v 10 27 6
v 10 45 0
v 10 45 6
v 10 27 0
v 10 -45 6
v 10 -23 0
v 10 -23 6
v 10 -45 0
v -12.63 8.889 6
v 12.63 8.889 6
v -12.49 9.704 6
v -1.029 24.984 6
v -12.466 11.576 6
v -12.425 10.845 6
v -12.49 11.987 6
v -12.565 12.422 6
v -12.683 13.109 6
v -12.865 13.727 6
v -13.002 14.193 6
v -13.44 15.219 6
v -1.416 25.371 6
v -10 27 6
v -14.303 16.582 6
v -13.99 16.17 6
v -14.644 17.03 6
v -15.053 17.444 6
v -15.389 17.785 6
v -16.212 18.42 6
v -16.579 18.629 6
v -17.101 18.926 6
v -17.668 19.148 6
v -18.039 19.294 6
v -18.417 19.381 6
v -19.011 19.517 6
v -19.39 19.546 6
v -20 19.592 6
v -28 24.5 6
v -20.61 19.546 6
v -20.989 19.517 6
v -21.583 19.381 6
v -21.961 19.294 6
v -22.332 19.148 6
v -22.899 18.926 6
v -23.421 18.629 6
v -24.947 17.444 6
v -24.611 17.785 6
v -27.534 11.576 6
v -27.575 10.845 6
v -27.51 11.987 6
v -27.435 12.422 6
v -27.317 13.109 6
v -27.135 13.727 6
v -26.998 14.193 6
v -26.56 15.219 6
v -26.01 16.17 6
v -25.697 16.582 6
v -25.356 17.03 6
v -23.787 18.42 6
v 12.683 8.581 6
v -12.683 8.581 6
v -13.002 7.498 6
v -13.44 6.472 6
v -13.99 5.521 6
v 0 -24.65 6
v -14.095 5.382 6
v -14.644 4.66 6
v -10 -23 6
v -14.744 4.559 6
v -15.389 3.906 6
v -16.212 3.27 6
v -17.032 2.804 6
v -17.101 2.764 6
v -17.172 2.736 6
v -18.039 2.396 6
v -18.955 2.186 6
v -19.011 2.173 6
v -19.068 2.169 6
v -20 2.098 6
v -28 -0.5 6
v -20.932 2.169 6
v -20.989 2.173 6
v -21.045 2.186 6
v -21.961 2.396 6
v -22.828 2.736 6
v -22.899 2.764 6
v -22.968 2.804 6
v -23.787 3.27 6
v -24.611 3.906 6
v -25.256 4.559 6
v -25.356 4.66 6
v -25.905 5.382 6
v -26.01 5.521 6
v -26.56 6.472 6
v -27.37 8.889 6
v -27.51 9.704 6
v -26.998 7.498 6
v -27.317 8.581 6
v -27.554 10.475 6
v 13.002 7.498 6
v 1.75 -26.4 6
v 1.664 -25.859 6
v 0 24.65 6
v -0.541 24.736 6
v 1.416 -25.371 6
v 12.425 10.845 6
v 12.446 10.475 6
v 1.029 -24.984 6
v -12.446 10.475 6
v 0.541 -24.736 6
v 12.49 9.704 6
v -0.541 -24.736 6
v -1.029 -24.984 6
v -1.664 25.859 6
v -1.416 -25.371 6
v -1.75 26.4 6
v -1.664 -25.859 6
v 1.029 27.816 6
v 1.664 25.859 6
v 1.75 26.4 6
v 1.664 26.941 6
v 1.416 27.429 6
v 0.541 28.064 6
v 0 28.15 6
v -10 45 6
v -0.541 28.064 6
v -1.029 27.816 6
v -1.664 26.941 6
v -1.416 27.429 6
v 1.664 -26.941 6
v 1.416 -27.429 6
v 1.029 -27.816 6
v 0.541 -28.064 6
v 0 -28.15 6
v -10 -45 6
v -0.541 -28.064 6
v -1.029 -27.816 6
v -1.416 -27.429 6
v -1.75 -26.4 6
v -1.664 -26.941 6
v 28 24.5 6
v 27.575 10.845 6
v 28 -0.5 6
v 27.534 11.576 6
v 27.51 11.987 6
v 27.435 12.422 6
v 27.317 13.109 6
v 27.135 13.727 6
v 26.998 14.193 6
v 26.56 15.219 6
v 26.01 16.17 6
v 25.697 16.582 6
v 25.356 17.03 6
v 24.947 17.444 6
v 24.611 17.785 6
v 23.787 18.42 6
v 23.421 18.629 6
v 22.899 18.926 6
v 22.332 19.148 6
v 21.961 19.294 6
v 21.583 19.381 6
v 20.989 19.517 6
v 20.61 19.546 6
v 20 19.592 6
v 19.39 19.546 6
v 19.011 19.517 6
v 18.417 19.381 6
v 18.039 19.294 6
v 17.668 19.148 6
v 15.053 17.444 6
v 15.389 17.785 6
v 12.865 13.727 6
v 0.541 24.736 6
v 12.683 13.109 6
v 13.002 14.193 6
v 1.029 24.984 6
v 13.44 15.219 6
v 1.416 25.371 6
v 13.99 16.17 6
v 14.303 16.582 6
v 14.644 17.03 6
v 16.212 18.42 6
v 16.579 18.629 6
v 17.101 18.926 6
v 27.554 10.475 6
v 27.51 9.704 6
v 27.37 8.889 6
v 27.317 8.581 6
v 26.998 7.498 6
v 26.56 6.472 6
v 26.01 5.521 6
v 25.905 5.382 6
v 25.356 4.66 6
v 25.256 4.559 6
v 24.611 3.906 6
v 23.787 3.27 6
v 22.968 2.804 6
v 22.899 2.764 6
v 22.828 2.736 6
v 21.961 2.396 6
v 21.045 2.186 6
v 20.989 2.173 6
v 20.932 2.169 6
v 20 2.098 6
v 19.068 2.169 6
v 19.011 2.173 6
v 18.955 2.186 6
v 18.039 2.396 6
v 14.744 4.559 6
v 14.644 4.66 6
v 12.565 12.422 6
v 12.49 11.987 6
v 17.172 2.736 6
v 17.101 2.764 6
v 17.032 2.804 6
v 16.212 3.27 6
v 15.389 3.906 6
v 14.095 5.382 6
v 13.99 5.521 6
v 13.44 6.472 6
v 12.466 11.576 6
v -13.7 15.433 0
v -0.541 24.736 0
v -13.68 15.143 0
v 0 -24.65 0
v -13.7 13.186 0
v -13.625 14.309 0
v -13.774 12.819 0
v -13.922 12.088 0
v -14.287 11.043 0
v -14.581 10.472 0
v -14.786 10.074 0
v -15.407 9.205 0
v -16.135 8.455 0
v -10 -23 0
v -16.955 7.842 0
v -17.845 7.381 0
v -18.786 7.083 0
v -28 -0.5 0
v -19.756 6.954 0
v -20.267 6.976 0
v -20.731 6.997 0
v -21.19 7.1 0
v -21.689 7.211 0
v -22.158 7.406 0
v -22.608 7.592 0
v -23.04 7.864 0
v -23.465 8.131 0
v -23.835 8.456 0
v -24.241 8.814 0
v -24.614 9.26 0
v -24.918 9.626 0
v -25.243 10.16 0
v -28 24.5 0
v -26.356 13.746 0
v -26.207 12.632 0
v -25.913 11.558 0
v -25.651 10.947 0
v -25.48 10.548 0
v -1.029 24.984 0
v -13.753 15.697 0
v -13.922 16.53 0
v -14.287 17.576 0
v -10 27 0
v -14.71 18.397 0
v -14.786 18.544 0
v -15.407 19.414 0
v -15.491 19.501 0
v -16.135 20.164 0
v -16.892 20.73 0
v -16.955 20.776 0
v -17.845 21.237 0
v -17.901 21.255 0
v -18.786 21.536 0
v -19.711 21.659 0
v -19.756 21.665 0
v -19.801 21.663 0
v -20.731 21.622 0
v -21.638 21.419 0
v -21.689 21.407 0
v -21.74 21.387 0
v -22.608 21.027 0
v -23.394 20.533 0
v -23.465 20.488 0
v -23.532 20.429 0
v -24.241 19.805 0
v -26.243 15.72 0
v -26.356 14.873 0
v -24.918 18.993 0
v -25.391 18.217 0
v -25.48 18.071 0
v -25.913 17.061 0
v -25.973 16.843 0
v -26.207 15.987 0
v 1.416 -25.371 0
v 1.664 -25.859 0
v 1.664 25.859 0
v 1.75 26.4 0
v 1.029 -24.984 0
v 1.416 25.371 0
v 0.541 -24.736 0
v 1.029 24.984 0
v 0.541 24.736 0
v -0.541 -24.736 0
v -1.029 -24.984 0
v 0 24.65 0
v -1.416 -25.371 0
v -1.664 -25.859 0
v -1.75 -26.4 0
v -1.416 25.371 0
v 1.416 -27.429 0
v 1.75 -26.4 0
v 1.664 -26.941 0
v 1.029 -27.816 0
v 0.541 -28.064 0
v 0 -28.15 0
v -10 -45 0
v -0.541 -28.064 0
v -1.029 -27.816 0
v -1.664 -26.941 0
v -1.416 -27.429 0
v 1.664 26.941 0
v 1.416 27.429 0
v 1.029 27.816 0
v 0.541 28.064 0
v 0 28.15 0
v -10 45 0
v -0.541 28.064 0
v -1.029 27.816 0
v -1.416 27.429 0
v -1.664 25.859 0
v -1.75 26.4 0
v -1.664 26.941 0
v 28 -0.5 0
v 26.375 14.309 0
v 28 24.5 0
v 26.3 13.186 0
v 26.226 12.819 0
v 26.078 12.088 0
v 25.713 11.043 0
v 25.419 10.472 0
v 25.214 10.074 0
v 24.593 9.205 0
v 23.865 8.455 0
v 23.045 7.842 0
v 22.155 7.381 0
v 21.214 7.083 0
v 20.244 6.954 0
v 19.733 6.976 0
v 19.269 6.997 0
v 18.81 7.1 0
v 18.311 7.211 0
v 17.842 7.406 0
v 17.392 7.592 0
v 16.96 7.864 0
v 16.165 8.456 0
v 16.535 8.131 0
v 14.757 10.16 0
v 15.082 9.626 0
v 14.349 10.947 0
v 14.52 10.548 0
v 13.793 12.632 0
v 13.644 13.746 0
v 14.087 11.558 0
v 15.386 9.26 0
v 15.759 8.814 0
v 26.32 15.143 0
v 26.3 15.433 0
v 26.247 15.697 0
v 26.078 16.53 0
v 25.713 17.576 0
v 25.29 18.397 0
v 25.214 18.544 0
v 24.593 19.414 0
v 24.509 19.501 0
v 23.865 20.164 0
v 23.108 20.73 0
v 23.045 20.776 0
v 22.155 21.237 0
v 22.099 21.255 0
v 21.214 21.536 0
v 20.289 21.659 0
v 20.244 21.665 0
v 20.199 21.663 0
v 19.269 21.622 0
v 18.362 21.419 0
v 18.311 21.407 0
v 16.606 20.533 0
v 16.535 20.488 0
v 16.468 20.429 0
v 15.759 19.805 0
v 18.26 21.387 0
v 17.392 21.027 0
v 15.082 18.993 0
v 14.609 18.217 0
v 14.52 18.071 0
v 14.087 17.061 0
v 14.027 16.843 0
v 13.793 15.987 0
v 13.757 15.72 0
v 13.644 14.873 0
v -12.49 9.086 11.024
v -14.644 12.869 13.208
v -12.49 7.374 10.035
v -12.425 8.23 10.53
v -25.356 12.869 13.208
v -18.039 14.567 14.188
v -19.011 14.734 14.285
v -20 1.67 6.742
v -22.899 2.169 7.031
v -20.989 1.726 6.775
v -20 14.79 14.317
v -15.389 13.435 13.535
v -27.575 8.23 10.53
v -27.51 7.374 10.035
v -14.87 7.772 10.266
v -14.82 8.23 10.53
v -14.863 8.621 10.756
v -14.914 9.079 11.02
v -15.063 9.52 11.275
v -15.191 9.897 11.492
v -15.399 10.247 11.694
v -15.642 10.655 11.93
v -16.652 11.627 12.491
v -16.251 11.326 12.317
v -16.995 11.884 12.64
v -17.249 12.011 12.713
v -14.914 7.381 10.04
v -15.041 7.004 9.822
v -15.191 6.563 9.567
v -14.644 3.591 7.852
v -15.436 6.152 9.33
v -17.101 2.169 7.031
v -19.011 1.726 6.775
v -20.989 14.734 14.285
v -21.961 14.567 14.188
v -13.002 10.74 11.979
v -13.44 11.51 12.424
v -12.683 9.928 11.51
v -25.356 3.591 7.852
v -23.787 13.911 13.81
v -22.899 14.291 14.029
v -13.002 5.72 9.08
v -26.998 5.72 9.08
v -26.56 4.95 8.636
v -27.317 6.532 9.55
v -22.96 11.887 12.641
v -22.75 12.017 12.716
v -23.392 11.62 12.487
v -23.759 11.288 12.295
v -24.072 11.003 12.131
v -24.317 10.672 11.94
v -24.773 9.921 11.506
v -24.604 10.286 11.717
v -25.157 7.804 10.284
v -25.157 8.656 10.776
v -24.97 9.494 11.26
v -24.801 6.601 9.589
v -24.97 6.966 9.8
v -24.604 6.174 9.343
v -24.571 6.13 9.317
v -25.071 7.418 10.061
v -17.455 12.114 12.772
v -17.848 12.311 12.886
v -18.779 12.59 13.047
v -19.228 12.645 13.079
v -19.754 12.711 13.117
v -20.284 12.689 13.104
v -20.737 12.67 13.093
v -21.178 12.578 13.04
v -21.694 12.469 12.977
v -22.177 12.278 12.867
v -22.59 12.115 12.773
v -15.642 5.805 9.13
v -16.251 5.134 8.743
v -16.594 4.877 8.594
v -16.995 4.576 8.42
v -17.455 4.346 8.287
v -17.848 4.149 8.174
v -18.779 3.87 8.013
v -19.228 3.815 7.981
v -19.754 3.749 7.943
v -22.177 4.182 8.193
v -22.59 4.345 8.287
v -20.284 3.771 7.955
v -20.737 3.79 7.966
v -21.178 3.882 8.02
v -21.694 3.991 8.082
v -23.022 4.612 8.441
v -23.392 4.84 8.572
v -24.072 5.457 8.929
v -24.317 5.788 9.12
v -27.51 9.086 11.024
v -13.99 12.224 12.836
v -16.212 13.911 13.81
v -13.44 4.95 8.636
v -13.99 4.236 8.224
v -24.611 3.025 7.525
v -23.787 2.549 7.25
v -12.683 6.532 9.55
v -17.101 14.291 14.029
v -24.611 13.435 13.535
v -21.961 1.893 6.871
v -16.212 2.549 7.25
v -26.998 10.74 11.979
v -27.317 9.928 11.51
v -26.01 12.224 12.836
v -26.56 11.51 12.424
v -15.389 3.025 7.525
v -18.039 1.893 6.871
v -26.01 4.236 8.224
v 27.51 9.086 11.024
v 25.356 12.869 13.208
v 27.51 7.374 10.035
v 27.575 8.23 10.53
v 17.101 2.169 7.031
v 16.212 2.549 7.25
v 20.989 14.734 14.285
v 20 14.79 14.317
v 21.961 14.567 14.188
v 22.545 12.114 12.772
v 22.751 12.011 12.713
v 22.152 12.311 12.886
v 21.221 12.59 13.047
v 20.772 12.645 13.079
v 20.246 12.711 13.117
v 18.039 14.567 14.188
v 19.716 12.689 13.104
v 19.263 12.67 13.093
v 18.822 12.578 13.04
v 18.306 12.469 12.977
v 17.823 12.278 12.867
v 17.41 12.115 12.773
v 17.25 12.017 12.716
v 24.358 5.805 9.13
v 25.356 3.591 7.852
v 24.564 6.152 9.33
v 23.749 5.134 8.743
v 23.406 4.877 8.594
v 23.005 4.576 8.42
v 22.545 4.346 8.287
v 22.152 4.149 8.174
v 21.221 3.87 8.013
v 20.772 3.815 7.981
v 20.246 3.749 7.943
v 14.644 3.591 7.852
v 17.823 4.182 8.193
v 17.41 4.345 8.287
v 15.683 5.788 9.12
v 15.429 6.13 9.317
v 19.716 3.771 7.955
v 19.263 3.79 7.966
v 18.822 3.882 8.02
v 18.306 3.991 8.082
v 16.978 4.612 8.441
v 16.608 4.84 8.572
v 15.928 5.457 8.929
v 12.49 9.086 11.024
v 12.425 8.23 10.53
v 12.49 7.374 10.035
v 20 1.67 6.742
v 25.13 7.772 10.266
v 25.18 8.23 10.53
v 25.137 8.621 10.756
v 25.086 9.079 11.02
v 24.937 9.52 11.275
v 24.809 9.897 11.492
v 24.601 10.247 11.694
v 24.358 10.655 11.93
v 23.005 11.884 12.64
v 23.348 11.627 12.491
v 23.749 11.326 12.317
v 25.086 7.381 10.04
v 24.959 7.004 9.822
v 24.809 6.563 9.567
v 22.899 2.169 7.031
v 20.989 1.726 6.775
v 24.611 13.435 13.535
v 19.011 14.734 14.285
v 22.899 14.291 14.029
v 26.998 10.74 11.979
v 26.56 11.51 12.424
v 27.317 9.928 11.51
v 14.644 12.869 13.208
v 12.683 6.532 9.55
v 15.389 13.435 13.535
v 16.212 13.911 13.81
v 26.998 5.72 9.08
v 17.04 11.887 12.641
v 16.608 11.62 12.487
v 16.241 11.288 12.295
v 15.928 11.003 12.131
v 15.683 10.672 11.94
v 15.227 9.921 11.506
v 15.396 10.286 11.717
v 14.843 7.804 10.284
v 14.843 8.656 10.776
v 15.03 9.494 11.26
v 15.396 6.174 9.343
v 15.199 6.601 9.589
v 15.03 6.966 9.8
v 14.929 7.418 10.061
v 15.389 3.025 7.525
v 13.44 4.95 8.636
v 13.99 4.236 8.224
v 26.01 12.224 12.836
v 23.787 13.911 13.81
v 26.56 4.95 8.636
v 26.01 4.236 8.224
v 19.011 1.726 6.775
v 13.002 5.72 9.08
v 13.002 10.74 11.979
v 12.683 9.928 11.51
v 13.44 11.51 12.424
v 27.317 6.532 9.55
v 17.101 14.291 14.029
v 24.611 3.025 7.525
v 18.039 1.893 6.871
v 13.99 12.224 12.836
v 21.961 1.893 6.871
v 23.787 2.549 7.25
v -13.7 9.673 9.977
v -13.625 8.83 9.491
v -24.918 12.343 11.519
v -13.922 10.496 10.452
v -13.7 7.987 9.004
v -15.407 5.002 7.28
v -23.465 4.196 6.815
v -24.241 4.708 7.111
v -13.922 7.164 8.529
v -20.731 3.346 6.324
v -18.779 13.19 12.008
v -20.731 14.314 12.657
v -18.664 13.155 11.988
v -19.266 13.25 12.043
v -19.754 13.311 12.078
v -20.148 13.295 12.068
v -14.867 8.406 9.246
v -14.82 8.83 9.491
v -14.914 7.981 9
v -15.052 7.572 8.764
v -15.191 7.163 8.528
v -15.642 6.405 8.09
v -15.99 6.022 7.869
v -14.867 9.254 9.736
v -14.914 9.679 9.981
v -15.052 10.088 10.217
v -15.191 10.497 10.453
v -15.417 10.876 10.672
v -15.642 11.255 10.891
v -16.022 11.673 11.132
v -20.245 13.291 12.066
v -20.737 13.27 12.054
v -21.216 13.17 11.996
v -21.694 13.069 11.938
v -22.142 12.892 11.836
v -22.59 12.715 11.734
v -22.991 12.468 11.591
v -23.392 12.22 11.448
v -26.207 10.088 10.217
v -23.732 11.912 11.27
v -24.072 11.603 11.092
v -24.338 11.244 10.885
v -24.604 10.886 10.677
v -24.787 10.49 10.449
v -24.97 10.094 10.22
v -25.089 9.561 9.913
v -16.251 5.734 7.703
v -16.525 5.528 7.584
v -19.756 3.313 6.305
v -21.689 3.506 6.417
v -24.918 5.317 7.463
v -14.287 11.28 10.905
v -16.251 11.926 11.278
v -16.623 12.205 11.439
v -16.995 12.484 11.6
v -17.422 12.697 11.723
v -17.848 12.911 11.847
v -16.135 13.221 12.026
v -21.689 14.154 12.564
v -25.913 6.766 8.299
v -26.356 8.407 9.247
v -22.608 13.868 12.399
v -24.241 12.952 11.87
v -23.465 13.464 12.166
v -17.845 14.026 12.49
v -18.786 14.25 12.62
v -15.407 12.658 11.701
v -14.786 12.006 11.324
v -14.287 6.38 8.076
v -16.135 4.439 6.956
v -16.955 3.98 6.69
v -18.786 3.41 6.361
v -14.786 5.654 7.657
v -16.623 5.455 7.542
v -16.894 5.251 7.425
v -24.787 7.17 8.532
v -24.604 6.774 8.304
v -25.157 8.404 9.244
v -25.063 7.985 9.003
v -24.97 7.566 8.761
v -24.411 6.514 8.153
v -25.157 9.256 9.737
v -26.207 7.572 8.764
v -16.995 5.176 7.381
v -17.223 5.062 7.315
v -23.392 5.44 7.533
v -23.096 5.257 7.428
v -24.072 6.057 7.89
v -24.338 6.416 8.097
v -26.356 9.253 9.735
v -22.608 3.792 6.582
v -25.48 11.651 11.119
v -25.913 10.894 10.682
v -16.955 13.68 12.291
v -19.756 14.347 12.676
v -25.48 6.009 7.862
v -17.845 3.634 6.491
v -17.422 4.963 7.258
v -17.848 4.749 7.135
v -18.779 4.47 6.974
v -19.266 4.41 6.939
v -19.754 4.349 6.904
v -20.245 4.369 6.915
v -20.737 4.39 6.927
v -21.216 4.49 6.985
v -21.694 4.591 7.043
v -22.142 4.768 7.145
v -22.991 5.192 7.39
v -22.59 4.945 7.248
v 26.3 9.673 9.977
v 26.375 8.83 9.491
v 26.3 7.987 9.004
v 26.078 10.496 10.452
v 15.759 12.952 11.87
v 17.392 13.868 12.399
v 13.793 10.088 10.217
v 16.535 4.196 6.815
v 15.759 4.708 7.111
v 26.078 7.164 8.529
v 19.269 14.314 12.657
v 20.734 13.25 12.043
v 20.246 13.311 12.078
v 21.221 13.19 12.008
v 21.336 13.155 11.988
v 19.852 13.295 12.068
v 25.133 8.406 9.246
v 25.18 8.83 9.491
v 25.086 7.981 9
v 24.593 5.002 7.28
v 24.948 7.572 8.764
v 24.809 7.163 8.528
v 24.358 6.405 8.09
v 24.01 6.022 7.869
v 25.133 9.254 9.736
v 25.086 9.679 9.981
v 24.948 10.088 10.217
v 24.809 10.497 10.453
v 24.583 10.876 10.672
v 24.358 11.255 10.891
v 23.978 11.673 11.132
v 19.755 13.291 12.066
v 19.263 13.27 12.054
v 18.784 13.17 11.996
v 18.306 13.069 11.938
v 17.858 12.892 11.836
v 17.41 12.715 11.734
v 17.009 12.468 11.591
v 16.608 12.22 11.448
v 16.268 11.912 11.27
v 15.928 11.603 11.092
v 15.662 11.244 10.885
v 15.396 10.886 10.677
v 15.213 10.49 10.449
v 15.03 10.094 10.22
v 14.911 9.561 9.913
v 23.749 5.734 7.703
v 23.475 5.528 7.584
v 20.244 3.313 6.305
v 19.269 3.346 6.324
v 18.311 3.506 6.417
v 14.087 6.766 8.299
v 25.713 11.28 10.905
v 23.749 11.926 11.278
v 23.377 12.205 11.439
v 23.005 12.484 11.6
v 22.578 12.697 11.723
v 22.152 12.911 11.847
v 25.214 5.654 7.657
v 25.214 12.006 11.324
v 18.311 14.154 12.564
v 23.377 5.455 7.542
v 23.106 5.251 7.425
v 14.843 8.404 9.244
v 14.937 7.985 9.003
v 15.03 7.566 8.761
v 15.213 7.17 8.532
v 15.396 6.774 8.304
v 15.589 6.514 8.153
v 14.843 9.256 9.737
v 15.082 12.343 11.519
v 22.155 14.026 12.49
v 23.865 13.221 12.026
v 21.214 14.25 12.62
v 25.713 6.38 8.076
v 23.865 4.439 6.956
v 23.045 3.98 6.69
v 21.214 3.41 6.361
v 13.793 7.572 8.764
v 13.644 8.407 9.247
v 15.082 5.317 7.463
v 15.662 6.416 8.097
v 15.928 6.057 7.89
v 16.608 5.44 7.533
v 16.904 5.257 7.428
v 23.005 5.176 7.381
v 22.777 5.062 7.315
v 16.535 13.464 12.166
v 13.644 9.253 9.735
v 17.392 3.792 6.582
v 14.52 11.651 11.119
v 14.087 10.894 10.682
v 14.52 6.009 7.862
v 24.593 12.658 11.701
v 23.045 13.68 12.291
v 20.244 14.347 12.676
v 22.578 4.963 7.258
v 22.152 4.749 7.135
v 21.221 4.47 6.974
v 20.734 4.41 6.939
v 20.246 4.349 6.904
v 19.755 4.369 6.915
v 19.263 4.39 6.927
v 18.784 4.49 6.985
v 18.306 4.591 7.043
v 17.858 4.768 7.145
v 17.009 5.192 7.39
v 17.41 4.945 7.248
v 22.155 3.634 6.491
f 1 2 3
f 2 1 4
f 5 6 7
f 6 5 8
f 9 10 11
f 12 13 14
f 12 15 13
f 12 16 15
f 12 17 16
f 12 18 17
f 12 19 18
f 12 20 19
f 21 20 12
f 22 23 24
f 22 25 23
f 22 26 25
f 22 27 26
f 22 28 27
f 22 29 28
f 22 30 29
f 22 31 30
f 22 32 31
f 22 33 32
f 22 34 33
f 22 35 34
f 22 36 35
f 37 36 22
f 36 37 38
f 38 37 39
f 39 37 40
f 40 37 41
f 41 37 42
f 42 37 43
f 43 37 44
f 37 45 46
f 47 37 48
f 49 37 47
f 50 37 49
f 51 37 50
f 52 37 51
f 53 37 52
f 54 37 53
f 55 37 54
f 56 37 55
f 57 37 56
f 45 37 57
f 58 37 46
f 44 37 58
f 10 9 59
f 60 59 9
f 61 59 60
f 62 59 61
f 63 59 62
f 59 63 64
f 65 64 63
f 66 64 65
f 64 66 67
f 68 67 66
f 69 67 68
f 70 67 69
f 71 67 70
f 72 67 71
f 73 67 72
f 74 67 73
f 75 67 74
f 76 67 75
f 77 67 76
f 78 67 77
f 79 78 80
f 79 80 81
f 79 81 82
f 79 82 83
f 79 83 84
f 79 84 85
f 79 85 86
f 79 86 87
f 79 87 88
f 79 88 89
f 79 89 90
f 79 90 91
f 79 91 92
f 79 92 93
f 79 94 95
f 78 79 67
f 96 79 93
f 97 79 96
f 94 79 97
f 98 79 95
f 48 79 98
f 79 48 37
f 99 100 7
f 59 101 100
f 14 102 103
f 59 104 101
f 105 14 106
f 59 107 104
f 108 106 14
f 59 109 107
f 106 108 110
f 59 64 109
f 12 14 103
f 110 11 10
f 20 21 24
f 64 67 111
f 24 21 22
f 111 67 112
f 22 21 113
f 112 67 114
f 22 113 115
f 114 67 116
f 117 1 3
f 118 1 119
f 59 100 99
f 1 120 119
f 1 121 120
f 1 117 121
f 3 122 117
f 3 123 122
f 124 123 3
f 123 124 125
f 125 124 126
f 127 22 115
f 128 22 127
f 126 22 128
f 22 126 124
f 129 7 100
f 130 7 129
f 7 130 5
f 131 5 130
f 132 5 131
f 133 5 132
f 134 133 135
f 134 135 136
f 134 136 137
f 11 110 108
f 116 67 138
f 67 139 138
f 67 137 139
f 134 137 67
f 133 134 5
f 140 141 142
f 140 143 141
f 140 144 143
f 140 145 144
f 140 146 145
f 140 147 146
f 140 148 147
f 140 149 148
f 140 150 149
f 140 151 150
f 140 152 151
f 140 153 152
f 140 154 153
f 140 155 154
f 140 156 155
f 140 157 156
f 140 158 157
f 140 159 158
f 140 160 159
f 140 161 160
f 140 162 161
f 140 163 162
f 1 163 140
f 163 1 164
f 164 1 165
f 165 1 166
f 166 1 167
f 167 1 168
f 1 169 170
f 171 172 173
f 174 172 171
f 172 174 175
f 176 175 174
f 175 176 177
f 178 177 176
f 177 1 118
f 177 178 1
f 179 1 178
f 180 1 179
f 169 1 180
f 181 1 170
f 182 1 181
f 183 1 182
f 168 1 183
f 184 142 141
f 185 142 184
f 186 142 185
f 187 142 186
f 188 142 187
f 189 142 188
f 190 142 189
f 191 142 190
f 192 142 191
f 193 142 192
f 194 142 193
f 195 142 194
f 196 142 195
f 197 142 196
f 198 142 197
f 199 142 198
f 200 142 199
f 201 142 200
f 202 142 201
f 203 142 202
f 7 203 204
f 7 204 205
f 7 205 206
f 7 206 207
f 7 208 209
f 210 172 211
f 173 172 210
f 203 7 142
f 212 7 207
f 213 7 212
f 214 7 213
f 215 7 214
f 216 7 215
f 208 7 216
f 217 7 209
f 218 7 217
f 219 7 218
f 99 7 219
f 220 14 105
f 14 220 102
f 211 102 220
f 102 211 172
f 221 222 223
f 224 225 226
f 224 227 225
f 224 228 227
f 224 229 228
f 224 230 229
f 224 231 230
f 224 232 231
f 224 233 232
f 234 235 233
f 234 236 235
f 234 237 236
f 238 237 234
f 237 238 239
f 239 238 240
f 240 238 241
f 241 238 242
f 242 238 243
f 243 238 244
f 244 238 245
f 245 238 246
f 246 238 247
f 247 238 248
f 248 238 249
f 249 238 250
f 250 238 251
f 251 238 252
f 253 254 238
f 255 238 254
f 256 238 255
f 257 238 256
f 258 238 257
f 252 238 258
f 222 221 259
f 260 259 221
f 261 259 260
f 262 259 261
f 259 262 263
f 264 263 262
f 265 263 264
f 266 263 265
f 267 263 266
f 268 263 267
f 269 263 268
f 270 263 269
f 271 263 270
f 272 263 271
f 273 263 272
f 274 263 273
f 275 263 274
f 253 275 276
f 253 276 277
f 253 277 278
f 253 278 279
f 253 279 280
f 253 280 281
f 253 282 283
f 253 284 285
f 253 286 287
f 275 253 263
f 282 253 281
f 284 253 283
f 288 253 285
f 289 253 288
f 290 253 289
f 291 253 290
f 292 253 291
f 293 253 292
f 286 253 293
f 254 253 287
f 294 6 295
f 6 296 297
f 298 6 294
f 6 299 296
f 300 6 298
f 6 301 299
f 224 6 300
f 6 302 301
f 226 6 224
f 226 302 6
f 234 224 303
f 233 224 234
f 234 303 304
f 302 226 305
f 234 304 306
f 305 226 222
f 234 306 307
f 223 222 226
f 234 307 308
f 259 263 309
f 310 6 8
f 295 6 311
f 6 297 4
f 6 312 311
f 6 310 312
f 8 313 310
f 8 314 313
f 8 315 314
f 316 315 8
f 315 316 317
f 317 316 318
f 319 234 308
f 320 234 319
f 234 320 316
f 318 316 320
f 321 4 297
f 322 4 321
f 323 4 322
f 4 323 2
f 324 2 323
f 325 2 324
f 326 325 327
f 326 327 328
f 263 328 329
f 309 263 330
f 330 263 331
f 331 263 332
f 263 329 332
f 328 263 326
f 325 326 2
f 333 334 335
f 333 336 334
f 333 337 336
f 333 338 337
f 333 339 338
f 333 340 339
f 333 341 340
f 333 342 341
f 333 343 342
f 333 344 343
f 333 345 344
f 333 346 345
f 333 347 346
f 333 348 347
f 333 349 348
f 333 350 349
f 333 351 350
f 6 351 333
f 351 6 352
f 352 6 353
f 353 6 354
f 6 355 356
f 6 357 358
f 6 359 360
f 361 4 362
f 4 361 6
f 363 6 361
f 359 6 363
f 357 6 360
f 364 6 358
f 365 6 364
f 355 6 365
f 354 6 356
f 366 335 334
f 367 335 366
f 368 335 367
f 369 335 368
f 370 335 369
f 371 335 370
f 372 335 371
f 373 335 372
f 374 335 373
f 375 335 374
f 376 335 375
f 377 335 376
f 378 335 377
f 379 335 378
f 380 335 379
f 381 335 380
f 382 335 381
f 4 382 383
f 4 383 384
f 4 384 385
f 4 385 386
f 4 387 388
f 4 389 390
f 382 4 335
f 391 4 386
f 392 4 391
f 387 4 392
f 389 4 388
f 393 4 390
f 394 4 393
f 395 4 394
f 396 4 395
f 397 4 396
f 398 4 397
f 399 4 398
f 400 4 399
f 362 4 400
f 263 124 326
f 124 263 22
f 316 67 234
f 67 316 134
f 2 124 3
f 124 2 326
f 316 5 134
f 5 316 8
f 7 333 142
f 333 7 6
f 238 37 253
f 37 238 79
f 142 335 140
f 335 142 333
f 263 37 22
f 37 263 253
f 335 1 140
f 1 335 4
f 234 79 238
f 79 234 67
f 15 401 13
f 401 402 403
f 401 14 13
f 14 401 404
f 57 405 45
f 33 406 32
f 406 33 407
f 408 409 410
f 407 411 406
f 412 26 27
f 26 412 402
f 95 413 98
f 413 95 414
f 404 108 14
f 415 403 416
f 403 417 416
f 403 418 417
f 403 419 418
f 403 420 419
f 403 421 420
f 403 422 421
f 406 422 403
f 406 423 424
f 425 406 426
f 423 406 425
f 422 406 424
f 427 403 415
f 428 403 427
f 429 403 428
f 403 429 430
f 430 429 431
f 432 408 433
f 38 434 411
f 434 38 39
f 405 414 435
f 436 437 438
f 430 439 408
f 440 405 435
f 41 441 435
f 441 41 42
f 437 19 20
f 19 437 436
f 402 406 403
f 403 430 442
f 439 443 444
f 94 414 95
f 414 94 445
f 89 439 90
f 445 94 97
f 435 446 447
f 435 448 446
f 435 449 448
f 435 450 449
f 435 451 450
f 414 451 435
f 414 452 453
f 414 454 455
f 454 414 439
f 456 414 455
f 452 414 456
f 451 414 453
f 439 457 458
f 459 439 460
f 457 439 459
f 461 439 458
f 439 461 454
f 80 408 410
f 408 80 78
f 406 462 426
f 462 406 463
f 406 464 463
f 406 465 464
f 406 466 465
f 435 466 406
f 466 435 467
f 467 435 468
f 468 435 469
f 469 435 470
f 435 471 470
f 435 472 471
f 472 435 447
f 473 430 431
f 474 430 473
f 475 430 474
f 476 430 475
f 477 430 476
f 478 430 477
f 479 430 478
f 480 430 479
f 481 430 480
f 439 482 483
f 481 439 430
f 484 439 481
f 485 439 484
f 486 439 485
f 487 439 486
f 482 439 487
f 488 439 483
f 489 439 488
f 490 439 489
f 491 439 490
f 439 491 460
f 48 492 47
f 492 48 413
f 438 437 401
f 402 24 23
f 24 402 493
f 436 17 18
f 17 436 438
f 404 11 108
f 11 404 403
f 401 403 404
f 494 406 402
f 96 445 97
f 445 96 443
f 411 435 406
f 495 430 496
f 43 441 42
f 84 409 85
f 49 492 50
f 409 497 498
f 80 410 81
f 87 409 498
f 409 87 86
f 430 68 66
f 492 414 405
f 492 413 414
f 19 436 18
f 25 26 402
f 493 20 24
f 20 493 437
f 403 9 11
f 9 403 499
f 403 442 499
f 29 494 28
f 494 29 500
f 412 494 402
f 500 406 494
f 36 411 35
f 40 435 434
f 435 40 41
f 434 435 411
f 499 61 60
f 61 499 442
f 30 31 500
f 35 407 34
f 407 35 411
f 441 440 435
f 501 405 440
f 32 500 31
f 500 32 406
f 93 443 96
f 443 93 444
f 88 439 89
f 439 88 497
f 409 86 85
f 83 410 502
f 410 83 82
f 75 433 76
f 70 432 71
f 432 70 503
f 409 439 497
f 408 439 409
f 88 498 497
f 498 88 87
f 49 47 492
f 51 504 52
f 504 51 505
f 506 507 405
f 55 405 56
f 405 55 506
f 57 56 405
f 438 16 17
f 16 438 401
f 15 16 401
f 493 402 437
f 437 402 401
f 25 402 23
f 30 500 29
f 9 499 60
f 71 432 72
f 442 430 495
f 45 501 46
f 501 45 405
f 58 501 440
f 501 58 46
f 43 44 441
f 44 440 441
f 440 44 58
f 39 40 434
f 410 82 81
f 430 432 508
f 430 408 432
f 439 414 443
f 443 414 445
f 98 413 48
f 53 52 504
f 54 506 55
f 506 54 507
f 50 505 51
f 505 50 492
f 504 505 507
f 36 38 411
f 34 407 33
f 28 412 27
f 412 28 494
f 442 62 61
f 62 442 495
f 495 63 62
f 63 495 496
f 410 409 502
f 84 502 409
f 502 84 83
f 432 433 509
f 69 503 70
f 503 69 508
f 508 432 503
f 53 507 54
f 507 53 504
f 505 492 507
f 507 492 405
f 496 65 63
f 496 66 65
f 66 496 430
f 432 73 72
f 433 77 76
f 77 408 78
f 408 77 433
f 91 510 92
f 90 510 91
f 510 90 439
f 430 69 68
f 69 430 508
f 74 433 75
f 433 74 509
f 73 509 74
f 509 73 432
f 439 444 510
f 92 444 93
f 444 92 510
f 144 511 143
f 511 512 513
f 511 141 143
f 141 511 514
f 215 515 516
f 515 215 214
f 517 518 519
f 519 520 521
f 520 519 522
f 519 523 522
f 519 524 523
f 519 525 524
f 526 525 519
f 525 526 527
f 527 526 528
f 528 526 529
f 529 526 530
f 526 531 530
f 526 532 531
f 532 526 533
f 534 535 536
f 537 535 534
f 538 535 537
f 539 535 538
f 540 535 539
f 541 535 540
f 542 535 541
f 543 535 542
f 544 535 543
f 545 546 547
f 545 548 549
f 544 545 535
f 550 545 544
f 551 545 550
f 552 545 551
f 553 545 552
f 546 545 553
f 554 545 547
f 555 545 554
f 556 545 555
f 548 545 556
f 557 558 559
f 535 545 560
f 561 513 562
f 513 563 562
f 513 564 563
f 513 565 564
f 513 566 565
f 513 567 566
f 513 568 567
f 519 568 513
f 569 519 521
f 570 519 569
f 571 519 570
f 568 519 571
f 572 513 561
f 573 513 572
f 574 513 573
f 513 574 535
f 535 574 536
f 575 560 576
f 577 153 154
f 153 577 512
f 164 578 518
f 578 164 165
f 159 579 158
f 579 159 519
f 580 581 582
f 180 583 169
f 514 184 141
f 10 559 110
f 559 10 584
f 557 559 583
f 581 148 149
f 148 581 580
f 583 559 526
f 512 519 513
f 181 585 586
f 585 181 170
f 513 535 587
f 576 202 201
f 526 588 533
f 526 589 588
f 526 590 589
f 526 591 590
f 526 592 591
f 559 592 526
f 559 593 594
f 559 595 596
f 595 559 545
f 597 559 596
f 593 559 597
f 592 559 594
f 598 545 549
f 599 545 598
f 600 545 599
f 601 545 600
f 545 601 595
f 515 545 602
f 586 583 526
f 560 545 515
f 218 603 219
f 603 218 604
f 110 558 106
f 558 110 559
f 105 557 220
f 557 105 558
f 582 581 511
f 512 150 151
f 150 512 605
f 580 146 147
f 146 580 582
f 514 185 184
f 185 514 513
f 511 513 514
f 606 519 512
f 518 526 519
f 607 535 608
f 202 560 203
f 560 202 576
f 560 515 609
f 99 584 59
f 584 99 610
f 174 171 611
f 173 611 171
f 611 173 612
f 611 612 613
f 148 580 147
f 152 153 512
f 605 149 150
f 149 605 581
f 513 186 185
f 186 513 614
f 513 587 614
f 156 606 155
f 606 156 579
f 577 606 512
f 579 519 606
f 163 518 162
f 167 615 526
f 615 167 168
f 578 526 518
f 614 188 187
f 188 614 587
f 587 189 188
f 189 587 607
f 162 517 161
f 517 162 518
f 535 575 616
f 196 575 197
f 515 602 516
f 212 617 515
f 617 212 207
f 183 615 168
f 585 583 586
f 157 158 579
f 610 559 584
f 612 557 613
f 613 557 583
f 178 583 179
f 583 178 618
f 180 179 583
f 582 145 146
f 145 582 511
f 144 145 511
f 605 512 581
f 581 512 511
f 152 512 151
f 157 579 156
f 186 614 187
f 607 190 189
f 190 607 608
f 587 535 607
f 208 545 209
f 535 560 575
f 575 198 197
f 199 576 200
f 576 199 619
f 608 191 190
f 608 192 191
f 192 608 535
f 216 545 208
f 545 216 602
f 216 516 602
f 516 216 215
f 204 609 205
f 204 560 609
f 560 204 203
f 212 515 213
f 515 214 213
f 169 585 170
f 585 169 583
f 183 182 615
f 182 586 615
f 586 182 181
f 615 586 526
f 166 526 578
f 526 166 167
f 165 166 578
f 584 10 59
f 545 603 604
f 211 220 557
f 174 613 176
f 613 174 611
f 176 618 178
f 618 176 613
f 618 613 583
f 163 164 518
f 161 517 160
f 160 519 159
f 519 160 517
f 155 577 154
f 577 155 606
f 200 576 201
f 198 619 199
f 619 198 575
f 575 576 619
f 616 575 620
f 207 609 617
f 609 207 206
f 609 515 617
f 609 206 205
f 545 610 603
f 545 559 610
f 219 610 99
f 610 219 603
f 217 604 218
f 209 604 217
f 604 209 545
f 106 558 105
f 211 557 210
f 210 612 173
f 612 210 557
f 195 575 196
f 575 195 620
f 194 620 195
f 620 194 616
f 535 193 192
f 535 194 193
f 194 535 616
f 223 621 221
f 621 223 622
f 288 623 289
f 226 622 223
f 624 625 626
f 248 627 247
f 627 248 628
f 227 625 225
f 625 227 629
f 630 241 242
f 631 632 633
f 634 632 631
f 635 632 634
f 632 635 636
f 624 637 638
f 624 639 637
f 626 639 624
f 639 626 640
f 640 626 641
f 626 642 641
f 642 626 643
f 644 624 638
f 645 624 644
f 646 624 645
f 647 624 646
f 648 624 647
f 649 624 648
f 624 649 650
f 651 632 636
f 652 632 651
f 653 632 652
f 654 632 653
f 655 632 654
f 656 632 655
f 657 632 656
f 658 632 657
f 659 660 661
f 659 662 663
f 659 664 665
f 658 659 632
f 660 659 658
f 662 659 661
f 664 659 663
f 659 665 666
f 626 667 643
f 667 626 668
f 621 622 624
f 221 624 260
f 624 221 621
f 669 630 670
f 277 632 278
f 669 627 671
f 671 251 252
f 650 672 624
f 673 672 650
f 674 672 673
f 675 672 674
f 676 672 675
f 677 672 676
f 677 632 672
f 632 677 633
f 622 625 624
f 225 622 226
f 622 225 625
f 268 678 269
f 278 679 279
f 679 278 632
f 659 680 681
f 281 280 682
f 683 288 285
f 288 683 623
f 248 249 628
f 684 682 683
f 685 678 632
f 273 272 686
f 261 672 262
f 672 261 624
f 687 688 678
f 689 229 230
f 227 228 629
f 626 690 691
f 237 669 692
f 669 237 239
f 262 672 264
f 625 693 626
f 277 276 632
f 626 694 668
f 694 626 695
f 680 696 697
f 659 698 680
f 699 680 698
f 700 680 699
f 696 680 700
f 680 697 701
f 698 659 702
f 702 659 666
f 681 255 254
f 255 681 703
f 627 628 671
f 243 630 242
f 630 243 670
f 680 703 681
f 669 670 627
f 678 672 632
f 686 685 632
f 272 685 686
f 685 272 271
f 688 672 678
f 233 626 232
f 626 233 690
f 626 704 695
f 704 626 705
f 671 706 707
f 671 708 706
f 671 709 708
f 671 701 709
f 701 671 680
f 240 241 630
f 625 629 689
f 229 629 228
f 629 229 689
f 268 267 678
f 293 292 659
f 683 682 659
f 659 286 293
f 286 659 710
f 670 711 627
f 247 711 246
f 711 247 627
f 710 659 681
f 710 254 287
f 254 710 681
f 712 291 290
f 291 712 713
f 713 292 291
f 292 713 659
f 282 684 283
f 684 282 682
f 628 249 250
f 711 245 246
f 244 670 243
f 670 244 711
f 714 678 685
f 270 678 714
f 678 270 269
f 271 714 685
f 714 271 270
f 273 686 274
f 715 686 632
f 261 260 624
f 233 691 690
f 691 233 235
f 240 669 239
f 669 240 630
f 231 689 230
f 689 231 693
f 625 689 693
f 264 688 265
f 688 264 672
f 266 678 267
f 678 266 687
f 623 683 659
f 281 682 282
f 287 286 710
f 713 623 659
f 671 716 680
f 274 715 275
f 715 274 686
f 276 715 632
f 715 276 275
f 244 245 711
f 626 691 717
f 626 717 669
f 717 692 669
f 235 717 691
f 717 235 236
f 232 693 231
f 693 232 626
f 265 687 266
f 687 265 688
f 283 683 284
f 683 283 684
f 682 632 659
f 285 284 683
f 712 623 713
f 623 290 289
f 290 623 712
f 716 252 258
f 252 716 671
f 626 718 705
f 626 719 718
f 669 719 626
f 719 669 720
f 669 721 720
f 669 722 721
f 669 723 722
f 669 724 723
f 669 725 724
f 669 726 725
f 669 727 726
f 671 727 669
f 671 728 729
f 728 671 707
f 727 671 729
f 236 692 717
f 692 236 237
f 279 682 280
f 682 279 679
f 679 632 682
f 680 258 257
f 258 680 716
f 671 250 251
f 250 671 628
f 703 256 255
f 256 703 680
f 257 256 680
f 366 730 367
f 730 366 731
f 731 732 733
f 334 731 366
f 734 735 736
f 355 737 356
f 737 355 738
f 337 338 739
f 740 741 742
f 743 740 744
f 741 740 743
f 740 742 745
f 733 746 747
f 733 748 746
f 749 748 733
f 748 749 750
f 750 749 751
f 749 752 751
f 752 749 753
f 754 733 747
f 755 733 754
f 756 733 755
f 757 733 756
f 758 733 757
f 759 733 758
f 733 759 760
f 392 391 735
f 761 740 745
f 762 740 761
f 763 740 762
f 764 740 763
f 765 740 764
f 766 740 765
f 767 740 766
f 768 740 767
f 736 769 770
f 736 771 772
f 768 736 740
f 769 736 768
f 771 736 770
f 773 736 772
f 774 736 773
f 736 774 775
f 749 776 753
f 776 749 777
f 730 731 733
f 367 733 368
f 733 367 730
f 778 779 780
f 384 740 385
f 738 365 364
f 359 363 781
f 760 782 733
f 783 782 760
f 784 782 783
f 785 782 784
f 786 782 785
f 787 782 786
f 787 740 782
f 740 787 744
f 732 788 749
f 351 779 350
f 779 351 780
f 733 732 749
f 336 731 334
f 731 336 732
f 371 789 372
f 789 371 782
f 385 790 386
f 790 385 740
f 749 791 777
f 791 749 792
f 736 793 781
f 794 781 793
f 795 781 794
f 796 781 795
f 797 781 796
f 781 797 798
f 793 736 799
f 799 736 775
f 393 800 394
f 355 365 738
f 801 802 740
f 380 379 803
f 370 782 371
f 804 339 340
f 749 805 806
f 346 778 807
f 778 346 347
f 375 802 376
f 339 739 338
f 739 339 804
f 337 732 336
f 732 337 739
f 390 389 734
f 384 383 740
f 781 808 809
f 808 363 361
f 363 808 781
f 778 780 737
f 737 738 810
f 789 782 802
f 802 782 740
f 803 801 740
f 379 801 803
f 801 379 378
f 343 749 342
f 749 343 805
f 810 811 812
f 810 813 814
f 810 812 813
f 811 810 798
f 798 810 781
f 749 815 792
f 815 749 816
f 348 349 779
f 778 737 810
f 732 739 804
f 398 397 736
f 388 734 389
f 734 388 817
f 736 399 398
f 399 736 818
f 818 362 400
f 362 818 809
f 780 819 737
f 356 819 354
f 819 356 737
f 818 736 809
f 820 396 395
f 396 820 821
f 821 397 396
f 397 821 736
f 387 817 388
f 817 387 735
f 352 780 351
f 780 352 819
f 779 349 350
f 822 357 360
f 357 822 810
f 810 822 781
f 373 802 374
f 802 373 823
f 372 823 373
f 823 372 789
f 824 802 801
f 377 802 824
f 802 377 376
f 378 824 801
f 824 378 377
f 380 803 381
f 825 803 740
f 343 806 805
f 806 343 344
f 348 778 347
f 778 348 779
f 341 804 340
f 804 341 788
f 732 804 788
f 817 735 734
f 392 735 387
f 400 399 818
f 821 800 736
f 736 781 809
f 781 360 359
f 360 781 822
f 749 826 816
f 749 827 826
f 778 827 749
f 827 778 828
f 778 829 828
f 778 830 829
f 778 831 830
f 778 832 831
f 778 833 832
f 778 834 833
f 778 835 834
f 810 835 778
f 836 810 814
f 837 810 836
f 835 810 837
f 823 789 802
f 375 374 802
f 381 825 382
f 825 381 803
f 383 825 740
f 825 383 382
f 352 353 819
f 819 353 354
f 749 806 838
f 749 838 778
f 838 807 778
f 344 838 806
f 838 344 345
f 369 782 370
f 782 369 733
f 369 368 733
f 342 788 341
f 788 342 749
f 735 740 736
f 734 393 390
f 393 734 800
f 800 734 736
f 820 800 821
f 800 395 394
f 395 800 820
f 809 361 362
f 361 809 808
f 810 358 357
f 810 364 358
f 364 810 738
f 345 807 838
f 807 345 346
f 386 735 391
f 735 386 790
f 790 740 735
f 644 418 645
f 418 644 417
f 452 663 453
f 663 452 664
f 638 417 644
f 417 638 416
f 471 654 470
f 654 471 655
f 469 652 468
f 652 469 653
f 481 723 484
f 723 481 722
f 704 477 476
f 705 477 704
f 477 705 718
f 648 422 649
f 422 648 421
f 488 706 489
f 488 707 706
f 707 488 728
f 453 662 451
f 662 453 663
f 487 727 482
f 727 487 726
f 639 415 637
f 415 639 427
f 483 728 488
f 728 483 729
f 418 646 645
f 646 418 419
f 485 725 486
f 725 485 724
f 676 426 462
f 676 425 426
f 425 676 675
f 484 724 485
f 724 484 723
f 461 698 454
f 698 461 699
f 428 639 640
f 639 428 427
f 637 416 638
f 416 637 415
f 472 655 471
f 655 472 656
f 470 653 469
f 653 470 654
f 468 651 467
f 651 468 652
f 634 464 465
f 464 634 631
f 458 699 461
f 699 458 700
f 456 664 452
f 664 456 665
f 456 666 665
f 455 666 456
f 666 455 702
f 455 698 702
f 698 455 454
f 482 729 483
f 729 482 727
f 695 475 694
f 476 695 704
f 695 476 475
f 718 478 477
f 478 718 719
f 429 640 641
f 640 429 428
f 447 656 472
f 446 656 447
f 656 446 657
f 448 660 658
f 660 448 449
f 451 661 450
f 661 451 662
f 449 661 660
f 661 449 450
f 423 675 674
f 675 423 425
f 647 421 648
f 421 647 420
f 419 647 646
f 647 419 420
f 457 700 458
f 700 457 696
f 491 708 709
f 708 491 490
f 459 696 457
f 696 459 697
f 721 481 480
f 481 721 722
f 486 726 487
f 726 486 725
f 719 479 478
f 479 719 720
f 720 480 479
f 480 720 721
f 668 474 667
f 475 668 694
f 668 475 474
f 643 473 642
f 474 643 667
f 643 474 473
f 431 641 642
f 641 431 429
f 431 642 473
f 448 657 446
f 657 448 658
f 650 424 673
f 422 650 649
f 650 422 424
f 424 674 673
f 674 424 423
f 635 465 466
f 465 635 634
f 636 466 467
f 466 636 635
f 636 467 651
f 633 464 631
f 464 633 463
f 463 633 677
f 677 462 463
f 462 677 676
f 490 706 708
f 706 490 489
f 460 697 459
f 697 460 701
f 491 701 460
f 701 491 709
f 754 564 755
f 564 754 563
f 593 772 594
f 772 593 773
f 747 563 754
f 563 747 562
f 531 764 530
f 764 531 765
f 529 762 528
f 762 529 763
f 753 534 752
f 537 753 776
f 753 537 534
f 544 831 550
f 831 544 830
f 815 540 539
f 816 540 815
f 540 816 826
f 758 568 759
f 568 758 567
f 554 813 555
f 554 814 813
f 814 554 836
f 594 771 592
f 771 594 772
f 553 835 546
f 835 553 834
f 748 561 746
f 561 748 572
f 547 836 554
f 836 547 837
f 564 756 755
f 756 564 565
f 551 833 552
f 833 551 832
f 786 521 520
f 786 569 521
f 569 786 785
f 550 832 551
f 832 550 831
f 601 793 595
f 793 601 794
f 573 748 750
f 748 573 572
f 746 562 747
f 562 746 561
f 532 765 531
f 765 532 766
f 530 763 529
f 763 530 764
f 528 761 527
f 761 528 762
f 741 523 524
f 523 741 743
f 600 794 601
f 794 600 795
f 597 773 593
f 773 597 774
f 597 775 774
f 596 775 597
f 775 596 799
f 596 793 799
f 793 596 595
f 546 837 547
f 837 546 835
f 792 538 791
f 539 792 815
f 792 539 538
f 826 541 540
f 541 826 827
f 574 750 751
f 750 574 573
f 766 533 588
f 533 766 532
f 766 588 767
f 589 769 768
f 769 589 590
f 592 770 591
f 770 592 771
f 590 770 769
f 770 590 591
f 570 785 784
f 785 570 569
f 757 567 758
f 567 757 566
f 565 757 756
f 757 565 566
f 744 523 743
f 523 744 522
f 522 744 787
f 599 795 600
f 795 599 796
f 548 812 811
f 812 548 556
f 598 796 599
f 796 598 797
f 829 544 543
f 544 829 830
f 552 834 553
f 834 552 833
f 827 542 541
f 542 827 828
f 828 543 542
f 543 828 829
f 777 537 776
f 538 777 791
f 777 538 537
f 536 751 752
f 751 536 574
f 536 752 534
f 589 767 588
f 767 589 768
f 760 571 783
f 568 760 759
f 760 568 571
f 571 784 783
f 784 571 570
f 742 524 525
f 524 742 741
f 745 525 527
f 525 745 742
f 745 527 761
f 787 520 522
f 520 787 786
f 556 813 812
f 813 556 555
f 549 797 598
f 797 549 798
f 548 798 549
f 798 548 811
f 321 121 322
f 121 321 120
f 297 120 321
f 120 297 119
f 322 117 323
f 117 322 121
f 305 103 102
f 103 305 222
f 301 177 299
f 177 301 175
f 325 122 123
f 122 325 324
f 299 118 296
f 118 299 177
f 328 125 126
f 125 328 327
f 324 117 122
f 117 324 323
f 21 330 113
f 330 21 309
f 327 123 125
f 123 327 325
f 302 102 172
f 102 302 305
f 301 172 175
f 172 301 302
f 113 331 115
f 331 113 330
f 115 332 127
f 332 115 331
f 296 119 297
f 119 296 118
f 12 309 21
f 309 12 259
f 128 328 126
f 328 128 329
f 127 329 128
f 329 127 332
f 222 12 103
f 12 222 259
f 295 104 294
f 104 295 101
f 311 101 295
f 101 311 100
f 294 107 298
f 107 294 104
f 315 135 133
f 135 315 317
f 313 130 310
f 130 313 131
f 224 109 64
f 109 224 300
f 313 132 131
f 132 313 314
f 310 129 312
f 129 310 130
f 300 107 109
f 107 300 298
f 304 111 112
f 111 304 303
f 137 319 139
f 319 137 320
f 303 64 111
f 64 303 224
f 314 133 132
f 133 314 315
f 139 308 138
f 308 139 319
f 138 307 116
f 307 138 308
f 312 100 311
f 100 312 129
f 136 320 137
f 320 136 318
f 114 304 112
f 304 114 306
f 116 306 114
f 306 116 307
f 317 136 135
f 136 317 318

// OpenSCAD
ep=0.01;
//m3 hardware numbers that work
m3nut_r=6.6/2;
m3nut_t=3;
m3slot=3.5;
slot_d=m3nut_r*sqrt(3);

arm_gap=40; //center to center
mag_d=12.05+.7;
mag_thick=2.77+.4;
mag_inner_d=8.36+2;
cup_wall=1.2;

base_thick=6;

$fa=1;
$fs=1;

plate_w=40;
plate_l=80;

module base_shape()
{
    translate([0,0,base_thick/2])cube([20,90,base_thick],center=true);
    hull()
    {
        translate([0,2,base_thick/2])cube([20,50,base_thick],center=true);
        translate([0,shift,0])translate([0,0,base_thick/2])cube([56,25,base_thick],center=true);
    }
}
shift=12;
angle=30; //angle from vertical
extra_z=4;
module magnet_posts()
{
    //create pair, rotate into position

        for (bb=[-0.5:1:0.5])
        {
            translate([arm_gap*bb,shift,extra_z])rotate([angle,0,0])
            {
                translate([0,0,-extra_z*2])cylinder(r=mag_d/2+cup_wall,h=extra_z*2+mag_thick*2+cup_wall);
            }
        }
    
}
module magnet_space()
{
    //magnet
    //create pair, rotate into position

        for (bb=[-0.5:1:0.5])
        {
            translate([arm_gap*bb,shift,extra_z])rotate([angle,0,0])
            {
                translate([0,0,-extra_z*2-1])cylinder(r=mag_d/2,h=extra_z*2+mag_thick*2+1);
            }
        }

    //ball access
        for (bb=[-0.5:1:0.5])
        {
            translate([arm_gap*bb,shift,extra_z])rotate([angle,0,0])
            {
                translate([0,0,-extra_z*2-1])cylinder(r=mag_inner_d/2,h=2*(extra_z*2+mag_thick*2+1));
            }
        }
    
}

module mount_holes()
{
    roller_gap_h=66; //distance, center to center, of the two rollers ont he same side
    translate([0,(roller_gap_h/2-m3nut_r*2),base_thick/2])
    {
        cylinder(r=m3slot/2,h=base_thick*2,$fn=20,center=true);
    }
    translate([0,-(roller_gap_h/2-m3nut_r*2),base_thick/2])
    {
        cylinder(r=m3slot/2,h=base_thick*2,$fn=20,center=true);
    }
}

module final()
{
    difference()
    {
        union()
        {
            base_shape();   
            magnet_posts();
        }
        magnet_space();
        mount_holes();
        translate([0,0,-10])cube([160,160,20],center=true);//make it flat on bottom
    }
}
final();

//fit check
//rotate([90,0,0])translate([0,-(10+8+1),0])import("../stl/roller_carriage.stl");
